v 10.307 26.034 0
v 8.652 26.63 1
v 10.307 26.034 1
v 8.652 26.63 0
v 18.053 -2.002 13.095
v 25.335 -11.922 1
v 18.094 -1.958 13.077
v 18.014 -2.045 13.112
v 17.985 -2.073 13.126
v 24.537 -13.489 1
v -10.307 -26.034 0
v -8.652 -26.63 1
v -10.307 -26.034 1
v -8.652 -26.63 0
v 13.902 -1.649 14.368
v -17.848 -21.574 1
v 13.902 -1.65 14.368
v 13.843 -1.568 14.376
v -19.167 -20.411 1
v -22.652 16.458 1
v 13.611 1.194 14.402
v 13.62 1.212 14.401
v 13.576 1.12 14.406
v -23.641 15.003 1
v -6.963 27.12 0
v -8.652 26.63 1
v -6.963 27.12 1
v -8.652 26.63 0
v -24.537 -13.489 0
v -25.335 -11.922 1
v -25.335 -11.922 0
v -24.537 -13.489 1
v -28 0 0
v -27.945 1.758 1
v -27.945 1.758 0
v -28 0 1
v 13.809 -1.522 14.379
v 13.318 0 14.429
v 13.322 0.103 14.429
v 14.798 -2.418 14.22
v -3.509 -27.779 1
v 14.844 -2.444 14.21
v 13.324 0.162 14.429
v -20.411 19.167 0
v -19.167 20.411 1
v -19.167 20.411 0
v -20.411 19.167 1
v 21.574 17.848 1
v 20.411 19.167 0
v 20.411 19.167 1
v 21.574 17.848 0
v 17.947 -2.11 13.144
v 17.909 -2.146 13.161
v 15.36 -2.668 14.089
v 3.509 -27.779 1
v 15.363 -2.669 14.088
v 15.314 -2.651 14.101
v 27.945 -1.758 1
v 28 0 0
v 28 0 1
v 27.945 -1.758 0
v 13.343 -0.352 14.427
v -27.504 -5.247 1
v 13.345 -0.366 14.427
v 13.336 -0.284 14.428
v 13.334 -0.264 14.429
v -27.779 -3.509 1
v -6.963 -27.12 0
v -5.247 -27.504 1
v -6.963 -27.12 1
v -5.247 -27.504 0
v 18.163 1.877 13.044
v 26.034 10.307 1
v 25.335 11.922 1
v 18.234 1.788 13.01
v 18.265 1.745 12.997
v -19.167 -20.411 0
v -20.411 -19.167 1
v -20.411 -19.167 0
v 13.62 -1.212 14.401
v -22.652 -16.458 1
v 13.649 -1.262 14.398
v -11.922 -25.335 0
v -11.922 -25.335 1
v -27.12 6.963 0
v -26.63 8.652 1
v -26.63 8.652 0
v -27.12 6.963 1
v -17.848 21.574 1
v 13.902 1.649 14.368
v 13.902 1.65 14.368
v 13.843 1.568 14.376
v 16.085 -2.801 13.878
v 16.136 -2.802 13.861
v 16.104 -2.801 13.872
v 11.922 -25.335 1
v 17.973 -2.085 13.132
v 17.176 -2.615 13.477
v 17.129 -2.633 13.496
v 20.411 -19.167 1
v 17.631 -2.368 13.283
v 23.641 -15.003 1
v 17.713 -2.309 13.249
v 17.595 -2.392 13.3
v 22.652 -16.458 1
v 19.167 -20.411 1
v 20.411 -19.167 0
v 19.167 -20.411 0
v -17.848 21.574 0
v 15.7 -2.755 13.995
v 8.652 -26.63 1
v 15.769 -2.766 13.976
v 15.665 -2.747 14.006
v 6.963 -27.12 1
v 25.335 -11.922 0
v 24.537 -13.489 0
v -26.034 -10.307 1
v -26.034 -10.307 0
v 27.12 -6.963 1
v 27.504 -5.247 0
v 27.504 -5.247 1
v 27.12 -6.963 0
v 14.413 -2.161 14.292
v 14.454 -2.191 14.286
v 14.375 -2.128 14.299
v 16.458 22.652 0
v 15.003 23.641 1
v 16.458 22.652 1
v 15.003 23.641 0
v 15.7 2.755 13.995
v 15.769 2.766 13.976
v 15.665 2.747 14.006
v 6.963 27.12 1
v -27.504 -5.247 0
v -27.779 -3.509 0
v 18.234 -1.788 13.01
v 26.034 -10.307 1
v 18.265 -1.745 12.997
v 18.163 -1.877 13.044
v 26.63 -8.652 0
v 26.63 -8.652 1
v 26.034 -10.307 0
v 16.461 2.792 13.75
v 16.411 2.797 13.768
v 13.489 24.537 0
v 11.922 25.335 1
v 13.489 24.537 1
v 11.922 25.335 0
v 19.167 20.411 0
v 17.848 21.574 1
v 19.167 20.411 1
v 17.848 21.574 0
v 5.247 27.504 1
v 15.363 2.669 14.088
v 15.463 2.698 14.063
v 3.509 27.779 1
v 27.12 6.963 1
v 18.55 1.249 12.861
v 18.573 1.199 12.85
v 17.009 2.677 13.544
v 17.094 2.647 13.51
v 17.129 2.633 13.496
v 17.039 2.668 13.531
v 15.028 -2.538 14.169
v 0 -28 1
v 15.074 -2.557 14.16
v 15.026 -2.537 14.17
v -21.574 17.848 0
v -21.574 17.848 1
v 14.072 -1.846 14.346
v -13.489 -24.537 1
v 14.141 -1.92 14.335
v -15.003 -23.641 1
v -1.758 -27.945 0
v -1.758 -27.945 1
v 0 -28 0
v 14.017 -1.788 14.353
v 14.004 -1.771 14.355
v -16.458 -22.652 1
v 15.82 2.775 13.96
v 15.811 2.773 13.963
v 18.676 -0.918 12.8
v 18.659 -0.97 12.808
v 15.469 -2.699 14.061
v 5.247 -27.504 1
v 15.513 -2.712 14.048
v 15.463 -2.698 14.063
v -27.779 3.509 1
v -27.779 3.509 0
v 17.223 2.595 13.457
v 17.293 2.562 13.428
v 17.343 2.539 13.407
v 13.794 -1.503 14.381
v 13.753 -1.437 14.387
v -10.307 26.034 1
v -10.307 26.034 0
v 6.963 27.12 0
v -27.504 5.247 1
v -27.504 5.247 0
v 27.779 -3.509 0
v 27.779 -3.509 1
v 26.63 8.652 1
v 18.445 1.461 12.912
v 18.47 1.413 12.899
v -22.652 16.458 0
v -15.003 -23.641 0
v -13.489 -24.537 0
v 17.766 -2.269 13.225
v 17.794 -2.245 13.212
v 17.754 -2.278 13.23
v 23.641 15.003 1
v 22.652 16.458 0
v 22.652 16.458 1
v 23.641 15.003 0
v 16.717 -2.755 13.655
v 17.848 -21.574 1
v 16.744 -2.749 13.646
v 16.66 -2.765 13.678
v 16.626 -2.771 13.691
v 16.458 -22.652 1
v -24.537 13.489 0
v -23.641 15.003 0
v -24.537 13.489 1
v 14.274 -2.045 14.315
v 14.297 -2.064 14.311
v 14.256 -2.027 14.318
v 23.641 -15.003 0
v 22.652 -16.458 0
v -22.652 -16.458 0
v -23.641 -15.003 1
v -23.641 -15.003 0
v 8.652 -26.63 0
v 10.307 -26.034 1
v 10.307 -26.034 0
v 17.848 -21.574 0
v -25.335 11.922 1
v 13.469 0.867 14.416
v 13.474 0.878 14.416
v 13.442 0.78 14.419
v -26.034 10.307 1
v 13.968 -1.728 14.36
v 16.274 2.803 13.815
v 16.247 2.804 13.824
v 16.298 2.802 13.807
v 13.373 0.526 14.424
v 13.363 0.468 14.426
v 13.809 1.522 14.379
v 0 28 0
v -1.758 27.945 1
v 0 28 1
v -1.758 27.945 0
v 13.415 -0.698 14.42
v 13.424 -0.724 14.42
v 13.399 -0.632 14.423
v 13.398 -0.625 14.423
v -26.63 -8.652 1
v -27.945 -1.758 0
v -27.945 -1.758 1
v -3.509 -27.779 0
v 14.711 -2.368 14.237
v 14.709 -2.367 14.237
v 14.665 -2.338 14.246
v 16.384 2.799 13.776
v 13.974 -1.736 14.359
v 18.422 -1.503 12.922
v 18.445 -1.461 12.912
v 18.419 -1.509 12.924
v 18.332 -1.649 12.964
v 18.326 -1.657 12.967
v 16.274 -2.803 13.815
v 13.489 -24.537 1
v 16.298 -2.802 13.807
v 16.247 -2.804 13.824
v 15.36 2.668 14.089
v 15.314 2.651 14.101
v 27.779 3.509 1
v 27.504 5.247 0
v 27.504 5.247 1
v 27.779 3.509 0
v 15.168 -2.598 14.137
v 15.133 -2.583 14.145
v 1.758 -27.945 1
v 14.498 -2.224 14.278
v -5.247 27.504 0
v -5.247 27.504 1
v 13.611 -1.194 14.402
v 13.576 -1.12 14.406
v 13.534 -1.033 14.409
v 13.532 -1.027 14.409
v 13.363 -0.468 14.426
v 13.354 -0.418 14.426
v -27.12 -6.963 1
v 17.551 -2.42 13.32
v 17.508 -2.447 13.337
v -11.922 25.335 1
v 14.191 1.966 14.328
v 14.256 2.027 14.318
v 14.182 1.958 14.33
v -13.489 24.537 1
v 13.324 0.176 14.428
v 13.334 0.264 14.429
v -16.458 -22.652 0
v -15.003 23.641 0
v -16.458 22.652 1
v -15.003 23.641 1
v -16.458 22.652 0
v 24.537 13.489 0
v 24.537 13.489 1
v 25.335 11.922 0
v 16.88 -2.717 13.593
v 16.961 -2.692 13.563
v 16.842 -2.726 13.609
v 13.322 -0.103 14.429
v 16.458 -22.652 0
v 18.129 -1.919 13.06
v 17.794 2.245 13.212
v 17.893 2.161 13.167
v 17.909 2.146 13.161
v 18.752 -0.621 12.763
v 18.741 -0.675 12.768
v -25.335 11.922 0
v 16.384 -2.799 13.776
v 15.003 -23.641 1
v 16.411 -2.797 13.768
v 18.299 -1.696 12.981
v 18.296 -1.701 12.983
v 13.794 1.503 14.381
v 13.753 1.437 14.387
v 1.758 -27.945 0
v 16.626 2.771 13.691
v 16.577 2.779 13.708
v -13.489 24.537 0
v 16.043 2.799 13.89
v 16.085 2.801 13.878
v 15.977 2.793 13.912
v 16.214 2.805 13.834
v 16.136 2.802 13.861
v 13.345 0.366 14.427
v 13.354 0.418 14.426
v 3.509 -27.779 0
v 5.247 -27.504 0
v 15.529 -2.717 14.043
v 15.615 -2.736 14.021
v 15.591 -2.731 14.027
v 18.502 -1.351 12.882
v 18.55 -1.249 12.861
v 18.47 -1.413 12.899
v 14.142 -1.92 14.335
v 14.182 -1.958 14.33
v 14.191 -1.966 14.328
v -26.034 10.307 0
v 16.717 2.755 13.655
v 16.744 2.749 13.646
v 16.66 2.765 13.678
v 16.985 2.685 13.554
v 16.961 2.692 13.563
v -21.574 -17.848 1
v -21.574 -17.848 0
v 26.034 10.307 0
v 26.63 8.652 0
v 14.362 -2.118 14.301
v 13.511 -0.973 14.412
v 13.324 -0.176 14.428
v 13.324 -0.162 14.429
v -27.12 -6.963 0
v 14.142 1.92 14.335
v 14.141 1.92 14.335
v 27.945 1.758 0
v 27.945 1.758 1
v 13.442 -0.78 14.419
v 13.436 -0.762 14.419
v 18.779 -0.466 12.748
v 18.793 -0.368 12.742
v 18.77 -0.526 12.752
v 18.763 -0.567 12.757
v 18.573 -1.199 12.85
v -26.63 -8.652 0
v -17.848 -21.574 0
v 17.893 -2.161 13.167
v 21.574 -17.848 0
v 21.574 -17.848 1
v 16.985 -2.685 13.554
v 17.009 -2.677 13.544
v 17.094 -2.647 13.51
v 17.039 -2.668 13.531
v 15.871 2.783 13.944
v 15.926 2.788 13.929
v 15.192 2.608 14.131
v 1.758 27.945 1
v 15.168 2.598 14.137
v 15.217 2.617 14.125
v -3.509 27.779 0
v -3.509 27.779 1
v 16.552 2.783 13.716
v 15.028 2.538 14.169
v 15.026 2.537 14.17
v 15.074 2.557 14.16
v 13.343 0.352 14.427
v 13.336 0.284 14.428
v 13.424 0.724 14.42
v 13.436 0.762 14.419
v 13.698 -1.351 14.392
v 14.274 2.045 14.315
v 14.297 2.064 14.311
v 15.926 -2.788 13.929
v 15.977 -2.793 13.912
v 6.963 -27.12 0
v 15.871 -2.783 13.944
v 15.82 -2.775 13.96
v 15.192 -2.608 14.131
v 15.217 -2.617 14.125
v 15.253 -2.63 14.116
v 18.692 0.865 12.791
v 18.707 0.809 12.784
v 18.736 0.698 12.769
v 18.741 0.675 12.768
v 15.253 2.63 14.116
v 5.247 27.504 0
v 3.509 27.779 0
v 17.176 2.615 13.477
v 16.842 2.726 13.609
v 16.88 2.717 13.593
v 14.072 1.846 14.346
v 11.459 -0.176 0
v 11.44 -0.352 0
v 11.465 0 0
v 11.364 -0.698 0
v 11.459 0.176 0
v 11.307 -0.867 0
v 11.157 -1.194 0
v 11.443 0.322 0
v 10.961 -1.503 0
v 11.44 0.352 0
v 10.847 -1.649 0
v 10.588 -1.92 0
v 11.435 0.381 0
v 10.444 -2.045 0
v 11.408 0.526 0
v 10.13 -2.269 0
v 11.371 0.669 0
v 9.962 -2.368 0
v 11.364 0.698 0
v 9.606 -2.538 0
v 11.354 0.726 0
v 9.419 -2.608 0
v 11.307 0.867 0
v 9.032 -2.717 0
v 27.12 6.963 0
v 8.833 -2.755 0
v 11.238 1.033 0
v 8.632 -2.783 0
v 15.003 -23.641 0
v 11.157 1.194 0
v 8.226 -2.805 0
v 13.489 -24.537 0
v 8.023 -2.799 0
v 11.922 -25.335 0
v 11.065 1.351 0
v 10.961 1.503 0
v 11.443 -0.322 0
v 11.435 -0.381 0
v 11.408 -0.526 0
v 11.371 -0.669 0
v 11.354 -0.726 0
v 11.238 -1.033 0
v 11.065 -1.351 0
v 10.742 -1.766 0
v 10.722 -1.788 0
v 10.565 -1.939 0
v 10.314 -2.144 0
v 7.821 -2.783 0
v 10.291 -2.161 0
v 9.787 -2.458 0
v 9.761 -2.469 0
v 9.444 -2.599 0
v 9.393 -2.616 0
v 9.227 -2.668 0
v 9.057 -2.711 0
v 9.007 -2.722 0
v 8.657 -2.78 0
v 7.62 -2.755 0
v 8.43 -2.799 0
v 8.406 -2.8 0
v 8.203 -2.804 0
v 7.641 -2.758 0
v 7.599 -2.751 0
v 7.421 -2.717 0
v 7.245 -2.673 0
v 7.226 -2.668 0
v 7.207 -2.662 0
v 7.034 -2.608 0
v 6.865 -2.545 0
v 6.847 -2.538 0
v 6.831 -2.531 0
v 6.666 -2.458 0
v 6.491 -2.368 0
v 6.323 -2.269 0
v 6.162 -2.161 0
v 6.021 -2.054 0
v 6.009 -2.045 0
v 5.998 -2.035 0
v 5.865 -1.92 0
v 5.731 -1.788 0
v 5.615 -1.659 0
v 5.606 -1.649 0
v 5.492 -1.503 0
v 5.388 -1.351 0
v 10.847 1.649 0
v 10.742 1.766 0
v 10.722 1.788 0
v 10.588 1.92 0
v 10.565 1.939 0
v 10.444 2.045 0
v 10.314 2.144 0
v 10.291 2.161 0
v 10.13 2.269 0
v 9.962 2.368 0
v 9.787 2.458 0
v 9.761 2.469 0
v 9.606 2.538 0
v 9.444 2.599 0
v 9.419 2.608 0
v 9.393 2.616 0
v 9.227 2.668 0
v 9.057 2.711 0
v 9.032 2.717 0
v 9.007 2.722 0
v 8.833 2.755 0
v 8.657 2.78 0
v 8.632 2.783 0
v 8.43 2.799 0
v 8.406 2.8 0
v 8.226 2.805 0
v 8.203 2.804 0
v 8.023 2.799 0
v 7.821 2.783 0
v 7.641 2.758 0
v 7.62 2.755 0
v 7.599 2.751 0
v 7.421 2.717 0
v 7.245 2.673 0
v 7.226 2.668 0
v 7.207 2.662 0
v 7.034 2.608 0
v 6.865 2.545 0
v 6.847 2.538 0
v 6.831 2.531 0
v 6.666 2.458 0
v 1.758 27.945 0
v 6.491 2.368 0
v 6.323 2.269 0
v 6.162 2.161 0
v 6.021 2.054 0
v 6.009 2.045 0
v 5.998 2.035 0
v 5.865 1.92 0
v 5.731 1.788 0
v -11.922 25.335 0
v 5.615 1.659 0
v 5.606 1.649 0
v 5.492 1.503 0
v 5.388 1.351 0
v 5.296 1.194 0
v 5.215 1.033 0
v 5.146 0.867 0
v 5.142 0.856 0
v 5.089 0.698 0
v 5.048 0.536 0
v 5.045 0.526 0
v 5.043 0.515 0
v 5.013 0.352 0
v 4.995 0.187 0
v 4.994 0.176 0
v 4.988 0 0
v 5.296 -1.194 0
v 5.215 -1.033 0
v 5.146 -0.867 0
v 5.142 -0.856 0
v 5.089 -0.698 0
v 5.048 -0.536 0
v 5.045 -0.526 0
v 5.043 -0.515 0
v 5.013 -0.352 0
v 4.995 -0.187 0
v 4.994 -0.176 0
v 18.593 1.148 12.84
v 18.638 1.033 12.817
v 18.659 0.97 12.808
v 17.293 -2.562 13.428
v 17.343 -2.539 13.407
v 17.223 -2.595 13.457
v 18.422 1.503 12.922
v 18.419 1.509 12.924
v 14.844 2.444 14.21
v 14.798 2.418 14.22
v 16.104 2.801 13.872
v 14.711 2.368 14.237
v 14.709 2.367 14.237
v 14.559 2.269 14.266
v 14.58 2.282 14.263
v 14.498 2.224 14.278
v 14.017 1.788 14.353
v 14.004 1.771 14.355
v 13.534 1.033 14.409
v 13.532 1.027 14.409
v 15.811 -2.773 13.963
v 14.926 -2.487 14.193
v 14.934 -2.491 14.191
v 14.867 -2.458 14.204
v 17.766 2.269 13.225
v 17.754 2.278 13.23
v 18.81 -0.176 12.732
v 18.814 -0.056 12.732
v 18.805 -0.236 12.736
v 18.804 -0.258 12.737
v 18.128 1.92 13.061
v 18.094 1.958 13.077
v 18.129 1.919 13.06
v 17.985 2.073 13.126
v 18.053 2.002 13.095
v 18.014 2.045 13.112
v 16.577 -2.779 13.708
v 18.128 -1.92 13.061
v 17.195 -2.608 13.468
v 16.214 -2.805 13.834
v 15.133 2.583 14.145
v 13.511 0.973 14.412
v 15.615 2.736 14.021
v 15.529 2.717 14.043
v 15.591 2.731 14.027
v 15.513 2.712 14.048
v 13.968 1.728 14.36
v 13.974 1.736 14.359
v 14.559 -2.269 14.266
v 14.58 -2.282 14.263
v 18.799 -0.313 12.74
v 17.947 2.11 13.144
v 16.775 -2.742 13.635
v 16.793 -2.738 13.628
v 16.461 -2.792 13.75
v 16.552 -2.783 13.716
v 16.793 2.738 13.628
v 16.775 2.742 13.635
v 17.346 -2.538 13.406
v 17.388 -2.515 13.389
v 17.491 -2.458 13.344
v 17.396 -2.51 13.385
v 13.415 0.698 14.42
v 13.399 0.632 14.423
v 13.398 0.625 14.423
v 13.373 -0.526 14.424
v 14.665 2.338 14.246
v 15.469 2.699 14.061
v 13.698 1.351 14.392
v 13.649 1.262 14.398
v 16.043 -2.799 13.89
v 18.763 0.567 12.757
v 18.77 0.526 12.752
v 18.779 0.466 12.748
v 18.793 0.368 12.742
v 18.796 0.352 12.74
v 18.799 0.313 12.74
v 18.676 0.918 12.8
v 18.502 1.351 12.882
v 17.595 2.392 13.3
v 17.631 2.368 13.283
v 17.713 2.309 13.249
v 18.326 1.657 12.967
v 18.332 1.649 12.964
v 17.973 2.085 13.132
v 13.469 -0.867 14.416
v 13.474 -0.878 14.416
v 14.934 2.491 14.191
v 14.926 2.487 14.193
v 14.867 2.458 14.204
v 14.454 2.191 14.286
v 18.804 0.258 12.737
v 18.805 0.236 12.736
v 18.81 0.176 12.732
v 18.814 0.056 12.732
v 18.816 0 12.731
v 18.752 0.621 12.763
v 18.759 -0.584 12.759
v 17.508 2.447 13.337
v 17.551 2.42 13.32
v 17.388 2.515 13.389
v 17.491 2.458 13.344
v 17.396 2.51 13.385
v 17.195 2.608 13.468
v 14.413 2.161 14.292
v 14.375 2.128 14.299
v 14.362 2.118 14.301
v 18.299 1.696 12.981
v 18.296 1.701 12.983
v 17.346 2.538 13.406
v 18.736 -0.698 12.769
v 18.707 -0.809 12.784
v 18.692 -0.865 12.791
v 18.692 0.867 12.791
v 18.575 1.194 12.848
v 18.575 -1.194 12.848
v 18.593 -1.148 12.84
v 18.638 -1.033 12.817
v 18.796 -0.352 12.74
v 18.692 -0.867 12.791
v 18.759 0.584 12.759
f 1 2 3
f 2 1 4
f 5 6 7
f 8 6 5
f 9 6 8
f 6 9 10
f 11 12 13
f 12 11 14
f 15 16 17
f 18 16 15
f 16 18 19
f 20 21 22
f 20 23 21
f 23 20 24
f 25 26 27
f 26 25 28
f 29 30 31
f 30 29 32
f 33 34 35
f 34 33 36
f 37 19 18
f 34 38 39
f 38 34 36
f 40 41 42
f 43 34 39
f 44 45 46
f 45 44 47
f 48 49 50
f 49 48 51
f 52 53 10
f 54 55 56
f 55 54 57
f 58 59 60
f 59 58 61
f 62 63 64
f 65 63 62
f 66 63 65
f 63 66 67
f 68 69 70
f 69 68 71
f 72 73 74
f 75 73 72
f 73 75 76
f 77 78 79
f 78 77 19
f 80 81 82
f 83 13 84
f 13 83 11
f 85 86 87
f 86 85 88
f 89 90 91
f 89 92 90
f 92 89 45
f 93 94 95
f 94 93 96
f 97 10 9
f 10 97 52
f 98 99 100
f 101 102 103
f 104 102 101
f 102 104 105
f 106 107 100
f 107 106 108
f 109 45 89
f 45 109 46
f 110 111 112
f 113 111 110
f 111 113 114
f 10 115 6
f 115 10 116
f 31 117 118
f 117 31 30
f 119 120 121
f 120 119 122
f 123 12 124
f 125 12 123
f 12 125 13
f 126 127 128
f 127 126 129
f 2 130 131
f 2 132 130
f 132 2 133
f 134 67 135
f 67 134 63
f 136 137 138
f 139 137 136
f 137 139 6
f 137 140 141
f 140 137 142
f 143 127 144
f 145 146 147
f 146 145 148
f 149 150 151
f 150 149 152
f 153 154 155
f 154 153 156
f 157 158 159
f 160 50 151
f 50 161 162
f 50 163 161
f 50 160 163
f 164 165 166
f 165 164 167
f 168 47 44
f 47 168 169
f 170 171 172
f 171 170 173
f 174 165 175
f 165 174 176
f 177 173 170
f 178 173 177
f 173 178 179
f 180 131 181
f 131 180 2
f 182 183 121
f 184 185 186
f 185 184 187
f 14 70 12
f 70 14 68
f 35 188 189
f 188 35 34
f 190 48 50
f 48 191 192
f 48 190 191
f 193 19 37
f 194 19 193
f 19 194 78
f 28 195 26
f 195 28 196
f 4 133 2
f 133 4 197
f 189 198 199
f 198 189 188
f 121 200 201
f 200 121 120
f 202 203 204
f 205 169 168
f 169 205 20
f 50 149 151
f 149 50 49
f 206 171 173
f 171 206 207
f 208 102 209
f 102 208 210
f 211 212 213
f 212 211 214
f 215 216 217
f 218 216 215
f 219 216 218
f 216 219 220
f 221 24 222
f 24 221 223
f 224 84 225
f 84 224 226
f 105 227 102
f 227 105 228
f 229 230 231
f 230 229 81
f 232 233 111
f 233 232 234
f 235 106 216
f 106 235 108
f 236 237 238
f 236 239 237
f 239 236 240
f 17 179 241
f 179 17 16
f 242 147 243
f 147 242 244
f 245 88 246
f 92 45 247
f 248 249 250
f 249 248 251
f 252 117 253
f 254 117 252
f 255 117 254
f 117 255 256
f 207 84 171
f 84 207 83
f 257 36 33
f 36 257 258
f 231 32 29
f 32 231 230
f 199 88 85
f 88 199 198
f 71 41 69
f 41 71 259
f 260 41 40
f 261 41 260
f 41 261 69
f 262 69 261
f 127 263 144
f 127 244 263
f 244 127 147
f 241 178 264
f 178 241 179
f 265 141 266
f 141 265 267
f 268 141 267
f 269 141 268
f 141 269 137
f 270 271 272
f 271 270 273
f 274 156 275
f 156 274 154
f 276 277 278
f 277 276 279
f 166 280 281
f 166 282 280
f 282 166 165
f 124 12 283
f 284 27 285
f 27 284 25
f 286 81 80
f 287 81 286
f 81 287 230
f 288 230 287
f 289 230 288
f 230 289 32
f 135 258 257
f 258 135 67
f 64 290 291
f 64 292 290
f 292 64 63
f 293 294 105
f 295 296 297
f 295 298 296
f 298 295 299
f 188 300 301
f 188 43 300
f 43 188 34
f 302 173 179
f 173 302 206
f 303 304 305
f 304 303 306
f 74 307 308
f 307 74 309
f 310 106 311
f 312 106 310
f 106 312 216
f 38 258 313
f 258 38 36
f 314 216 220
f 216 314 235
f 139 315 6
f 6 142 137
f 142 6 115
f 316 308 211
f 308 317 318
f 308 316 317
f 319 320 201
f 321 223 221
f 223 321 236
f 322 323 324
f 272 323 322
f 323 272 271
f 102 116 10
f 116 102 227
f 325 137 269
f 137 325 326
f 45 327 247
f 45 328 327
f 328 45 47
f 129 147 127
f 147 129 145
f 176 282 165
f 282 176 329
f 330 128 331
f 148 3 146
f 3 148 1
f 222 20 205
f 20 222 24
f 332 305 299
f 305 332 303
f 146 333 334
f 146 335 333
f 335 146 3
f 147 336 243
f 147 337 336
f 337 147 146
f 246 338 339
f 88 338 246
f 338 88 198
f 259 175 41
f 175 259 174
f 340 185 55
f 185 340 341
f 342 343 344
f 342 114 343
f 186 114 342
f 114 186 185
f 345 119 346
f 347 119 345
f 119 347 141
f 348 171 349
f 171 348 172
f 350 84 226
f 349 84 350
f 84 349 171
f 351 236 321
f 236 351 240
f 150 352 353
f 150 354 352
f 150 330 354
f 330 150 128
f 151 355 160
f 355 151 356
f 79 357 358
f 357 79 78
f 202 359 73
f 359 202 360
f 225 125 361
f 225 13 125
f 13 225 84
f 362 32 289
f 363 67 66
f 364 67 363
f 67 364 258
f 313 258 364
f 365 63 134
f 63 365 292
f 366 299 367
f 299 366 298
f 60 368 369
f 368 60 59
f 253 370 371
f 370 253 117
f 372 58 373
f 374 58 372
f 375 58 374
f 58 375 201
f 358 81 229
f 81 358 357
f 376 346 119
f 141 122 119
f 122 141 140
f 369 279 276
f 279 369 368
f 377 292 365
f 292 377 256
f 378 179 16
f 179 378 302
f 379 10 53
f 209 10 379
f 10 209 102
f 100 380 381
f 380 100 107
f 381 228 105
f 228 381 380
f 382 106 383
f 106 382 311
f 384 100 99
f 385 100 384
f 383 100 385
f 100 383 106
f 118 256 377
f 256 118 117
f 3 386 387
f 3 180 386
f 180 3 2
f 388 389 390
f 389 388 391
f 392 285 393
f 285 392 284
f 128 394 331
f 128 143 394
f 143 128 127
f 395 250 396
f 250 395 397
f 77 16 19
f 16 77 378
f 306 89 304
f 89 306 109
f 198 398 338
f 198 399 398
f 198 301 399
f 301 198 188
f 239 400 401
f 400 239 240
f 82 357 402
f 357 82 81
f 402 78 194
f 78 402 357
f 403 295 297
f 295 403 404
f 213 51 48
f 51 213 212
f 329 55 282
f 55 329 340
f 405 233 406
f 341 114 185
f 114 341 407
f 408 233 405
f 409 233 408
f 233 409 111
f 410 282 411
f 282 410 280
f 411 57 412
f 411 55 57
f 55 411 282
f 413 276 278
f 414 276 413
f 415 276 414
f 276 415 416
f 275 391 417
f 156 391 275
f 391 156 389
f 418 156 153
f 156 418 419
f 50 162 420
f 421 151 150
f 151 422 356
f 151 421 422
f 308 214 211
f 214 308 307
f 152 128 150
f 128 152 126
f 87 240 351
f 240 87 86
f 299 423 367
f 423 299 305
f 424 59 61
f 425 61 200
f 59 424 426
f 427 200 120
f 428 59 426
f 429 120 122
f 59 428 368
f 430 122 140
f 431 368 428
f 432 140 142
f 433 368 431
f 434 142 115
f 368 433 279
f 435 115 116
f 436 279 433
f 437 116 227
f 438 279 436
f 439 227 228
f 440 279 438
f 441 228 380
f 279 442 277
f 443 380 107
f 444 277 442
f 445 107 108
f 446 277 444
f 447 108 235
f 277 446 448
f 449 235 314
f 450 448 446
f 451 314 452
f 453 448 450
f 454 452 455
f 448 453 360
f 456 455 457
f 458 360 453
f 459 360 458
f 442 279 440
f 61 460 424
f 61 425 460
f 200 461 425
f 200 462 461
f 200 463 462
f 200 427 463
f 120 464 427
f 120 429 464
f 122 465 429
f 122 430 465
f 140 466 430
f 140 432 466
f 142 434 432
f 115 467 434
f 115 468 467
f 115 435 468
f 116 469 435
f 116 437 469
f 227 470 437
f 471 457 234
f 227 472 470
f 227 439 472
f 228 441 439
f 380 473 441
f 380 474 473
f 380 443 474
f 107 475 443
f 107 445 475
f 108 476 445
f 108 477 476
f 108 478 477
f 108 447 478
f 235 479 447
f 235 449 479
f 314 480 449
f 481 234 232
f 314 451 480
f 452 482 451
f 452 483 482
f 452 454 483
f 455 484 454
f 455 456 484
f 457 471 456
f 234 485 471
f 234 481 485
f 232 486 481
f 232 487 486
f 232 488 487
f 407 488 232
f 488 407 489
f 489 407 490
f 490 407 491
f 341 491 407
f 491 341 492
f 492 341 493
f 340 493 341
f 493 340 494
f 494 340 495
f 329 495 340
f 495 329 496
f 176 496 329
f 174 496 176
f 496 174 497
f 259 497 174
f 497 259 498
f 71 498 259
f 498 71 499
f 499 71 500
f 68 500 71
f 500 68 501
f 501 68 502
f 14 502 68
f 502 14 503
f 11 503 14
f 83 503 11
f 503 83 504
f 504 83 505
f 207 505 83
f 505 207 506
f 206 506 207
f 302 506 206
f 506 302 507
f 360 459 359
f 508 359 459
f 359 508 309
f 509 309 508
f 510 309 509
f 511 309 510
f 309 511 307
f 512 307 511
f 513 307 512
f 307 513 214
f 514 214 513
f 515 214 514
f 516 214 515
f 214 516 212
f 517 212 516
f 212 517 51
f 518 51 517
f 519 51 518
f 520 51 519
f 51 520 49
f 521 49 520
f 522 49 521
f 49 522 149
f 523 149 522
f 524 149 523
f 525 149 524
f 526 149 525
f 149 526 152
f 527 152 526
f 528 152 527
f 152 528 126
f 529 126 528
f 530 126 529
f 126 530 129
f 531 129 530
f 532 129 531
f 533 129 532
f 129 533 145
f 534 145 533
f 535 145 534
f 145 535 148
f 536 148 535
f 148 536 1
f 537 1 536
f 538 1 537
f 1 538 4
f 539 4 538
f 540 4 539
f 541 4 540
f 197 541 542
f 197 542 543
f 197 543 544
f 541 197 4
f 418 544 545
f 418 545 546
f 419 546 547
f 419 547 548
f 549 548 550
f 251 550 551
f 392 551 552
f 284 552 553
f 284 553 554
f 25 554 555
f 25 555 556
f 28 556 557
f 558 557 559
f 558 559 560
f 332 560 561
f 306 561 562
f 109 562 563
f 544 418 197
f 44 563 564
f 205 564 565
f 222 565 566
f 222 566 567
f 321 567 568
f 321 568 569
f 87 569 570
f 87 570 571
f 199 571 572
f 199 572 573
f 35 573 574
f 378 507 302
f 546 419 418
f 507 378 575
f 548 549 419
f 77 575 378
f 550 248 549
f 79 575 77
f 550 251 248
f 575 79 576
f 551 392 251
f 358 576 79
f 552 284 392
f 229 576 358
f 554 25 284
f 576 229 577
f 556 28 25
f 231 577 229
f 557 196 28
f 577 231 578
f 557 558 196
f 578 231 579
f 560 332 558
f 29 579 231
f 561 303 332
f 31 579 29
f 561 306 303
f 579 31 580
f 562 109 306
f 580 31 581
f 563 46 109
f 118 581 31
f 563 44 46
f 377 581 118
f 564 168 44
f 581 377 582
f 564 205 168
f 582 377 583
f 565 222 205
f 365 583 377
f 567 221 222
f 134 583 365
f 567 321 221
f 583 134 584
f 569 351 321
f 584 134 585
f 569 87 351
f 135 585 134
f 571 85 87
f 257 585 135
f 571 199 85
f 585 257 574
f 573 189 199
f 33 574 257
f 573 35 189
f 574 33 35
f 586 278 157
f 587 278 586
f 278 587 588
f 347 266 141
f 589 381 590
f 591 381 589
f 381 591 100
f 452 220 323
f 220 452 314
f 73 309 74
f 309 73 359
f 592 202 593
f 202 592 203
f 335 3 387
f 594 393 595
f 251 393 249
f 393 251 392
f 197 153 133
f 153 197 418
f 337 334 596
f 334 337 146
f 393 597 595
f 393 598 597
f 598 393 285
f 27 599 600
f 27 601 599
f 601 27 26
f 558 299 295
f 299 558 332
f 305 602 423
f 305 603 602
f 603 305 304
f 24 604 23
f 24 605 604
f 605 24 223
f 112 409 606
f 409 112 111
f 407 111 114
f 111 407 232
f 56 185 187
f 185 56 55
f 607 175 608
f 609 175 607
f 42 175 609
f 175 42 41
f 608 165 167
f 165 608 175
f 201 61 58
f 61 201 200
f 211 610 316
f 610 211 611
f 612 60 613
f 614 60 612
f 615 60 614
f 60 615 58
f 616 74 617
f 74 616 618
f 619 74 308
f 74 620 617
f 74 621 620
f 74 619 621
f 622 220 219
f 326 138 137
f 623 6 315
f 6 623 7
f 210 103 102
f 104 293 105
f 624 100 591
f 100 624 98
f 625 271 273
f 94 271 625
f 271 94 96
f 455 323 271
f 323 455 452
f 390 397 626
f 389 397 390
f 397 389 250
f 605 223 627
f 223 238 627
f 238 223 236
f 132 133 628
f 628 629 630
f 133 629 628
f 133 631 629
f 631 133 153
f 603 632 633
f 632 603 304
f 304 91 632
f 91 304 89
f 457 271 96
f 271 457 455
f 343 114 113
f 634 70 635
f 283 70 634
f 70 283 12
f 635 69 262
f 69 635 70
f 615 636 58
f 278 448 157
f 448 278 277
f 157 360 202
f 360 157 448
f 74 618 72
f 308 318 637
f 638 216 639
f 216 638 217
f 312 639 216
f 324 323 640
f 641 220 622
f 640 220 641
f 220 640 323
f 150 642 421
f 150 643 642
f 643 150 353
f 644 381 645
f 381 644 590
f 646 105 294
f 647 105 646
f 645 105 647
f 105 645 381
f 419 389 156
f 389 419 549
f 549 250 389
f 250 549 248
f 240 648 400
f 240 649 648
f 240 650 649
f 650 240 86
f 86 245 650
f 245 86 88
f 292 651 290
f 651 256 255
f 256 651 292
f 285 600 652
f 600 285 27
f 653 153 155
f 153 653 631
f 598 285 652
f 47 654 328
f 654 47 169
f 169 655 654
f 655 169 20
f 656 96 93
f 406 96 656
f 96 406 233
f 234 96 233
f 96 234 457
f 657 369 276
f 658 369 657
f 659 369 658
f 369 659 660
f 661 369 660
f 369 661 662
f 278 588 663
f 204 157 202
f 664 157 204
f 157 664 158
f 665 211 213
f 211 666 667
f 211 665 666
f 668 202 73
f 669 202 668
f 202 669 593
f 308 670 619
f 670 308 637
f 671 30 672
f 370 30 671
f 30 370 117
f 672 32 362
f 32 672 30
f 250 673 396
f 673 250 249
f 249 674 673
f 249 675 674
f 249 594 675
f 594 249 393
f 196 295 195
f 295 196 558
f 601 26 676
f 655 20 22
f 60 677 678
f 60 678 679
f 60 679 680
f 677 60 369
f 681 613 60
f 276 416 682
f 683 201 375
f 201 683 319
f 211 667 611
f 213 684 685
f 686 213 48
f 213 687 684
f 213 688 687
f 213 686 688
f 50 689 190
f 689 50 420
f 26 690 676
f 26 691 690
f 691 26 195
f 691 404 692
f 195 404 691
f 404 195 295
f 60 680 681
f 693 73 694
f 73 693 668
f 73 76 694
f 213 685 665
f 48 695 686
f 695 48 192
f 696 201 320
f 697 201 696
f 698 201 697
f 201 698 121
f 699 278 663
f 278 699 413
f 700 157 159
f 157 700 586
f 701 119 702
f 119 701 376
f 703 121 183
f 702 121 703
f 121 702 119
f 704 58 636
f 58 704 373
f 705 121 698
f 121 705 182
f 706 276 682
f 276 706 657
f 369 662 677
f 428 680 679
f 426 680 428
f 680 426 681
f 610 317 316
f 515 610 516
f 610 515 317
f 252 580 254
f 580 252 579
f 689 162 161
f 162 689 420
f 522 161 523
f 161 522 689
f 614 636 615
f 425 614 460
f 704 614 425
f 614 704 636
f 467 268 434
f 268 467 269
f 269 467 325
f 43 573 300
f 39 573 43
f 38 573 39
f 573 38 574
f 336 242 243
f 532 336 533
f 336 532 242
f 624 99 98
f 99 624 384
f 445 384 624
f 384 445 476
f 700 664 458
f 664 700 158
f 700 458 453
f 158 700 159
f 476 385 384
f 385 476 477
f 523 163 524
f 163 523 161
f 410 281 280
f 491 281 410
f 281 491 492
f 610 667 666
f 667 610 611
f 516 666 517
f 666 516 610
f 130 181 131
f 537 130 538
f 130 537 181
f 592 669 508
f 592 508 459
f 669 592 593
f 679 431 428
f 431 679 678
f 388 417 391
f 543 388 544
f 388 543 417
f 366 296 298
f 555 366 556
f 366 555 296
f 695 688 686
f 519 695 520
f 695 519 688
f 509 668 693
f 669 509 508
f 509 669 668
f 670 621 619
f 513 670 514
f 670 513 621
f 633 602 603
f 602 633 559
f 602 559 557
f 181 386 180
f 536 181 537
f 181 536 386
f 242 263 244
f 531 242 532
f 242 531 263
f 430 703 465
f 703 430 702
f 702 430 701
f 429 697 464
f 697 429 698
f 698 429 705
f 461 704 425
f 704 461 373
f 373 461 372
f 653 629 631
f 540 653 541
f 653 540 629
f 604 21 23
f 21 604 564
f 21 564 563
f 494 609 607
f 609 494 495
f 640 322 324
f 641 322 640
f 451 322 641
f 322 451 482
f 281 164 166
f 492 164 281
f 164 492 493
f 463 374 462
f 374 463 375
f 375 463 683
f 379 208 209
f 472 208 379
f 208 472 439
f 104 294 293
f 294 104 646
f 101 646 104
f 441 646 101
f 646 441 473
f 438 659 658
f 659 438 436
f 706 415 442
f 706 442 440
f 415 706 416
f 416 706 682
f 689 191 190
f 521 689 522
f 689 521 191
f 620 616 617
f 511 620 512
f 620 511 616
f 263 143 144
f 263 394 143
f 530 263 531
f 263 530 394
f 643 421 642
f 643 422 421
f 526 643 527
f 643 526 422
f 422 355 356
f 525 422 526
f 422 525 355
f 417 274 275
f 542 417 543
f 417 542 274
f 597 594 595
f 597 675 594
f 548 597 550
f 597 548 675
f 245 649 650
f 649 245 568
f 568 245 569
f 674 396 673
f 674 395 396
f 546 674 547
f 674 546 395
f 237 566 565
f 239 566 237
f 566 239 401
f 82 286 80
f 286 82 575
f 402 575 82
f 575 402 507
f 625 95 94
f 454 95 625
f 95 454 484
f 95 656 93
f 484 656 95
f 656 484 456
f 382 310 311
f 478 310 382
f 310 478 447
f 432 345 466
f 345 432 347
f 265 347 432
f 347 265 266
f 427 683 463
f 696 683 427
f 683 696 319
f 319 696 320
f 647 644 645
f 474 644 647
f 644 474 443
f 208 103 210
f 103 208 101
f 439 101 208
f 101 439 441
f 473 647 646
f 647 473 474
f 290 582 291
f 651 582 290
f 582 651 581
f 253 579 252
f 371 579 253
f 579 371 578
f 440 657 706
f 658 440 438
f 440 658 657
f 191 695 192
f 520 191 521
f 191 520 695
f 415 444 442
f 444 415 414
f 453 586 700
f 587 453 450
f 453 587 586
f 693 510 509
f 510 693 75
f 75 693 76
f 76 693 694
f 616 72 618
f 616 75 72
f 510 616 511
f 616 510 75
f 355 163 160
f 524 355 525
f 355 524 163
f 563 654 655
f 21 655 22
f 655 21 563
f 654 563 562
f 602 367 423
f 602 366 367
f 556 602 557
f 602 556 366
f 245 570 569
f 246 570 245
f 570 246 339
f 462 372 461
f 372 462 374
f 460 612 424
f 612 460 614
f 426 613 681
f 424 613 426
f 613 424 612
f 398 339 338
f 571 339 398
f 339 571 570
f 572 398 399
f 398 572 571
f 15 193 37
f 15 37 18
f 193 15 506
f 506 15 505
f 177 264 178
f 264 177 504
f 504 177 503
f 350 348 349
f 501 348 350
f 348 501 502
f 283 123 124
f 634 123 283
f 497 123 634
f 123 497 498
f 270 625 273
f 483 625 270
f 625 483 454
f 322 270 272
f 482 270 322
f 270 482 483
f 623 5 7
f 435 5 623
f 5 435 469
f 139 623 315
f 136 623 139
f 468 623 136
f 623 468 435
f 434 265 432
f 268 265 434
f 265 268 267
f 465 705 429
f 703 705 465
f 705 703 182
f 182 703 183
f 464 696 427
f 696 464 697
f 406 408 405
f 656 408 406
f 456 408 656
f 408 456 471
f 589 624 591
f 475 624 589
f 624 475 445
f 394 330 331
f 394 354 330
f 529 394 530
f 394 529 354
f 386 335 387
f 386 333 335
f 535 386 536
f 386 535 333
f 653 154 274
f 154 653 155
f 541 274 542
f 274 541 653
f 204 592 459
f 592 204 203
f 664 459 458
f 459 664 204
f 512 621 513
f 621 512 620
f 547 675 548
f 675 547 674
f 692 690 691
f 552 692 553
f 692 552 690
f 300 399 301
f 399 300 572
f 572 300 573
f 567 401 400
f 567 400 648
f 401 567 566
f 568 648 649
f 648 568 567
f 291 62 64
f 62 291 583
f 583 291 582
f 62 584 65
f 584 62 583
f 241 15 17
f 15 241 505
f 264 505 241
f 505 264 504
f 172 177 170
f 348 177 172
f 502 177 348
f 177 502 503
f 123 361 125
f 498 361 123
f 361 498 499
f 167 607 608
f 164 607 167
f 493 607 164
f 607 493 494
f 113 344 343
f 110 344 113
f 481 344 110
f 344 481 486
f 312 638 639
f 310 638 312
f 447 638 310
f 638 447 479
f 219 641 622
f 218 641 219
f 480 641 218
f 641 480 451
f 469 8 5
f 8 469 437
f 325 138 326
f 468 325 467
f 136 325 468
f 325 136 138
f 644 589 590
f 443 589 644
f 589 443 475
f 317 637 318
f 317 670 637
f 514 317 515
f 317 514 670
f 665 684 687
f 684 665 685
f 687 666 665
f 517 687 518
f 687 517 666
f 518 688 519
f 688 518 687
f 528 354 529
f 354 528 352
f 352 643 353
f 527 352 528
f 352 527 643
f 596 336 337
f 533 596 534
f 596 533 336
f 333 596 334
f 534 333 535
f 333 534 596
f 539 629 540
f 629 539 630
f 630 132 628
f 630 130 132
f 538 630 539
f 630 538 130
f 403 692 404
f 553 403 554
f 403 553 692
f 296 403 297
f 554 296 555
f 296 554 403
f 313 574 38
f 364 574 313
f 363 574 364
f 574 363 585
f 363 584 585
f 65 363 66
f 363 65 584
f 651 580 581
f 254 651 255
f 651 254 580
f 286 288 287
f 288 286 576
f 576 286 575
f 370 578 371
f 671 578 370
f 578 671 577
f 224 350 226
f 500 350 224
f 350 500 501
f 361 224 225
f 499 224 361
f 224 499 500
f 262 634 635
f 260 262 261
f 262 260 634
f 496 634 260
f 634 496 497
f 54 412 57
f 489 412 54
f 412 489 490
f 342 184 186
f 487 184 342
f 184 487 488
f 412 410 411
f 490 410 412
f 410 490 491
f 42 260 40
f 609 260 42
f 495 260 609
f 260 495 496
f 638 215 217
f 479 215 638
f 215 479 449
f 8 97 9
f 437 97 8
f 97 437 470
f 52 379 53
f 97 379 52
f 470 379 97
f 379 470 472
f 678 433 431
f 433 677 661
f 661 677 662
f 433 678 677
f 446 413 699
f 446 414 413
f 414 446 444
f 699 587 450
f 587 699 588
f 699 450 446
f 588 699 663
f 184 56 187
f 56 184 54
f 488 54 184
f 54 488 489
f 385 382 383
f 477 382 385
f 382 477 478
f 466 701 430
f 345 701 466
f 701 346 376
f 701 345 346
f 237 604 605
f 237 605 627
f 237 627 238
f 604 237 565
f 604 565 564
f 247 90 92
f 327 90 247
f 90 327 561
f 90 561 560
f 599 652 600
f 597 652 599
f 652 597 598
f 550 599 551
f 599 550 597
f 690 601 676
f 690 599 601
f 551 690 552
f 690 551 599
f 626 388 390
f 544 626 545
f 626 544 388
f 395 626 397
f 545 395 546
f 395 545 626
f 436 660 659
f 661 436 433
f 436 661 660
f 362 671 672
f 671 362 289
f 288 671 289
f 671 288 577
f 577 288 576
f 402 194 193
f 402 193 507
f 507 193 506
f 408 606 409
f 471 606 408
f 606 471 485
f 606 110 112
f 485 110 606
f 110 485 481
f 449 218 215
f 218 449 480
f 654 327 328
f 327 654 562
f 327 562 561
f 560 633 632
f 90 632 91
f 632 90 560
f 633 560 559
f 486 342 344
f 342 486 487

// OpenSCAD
$fn = 100;

$diameter = 56;
$thick = 10;
$face_dia = 11;
$shaft_dia = 5.61;

difference(){
    hull(){
            cylinder(1, $diameter / 2, $diameter / 2);
        
        
        translate([$diameter/4,0,$thick]){
            rotate([0,30,0]){
                cylinder(h=1, $face_dia/2, $face_dia/2);
            

            }
        }
    }//hull


    
    //shaft
    translate([$diameter/4,0,$thick]){
    rotate([0,30,0]){

    cylinder(h = $thick*3, r=$shaft_dia/2, center=true);
    
    }
    }
}
